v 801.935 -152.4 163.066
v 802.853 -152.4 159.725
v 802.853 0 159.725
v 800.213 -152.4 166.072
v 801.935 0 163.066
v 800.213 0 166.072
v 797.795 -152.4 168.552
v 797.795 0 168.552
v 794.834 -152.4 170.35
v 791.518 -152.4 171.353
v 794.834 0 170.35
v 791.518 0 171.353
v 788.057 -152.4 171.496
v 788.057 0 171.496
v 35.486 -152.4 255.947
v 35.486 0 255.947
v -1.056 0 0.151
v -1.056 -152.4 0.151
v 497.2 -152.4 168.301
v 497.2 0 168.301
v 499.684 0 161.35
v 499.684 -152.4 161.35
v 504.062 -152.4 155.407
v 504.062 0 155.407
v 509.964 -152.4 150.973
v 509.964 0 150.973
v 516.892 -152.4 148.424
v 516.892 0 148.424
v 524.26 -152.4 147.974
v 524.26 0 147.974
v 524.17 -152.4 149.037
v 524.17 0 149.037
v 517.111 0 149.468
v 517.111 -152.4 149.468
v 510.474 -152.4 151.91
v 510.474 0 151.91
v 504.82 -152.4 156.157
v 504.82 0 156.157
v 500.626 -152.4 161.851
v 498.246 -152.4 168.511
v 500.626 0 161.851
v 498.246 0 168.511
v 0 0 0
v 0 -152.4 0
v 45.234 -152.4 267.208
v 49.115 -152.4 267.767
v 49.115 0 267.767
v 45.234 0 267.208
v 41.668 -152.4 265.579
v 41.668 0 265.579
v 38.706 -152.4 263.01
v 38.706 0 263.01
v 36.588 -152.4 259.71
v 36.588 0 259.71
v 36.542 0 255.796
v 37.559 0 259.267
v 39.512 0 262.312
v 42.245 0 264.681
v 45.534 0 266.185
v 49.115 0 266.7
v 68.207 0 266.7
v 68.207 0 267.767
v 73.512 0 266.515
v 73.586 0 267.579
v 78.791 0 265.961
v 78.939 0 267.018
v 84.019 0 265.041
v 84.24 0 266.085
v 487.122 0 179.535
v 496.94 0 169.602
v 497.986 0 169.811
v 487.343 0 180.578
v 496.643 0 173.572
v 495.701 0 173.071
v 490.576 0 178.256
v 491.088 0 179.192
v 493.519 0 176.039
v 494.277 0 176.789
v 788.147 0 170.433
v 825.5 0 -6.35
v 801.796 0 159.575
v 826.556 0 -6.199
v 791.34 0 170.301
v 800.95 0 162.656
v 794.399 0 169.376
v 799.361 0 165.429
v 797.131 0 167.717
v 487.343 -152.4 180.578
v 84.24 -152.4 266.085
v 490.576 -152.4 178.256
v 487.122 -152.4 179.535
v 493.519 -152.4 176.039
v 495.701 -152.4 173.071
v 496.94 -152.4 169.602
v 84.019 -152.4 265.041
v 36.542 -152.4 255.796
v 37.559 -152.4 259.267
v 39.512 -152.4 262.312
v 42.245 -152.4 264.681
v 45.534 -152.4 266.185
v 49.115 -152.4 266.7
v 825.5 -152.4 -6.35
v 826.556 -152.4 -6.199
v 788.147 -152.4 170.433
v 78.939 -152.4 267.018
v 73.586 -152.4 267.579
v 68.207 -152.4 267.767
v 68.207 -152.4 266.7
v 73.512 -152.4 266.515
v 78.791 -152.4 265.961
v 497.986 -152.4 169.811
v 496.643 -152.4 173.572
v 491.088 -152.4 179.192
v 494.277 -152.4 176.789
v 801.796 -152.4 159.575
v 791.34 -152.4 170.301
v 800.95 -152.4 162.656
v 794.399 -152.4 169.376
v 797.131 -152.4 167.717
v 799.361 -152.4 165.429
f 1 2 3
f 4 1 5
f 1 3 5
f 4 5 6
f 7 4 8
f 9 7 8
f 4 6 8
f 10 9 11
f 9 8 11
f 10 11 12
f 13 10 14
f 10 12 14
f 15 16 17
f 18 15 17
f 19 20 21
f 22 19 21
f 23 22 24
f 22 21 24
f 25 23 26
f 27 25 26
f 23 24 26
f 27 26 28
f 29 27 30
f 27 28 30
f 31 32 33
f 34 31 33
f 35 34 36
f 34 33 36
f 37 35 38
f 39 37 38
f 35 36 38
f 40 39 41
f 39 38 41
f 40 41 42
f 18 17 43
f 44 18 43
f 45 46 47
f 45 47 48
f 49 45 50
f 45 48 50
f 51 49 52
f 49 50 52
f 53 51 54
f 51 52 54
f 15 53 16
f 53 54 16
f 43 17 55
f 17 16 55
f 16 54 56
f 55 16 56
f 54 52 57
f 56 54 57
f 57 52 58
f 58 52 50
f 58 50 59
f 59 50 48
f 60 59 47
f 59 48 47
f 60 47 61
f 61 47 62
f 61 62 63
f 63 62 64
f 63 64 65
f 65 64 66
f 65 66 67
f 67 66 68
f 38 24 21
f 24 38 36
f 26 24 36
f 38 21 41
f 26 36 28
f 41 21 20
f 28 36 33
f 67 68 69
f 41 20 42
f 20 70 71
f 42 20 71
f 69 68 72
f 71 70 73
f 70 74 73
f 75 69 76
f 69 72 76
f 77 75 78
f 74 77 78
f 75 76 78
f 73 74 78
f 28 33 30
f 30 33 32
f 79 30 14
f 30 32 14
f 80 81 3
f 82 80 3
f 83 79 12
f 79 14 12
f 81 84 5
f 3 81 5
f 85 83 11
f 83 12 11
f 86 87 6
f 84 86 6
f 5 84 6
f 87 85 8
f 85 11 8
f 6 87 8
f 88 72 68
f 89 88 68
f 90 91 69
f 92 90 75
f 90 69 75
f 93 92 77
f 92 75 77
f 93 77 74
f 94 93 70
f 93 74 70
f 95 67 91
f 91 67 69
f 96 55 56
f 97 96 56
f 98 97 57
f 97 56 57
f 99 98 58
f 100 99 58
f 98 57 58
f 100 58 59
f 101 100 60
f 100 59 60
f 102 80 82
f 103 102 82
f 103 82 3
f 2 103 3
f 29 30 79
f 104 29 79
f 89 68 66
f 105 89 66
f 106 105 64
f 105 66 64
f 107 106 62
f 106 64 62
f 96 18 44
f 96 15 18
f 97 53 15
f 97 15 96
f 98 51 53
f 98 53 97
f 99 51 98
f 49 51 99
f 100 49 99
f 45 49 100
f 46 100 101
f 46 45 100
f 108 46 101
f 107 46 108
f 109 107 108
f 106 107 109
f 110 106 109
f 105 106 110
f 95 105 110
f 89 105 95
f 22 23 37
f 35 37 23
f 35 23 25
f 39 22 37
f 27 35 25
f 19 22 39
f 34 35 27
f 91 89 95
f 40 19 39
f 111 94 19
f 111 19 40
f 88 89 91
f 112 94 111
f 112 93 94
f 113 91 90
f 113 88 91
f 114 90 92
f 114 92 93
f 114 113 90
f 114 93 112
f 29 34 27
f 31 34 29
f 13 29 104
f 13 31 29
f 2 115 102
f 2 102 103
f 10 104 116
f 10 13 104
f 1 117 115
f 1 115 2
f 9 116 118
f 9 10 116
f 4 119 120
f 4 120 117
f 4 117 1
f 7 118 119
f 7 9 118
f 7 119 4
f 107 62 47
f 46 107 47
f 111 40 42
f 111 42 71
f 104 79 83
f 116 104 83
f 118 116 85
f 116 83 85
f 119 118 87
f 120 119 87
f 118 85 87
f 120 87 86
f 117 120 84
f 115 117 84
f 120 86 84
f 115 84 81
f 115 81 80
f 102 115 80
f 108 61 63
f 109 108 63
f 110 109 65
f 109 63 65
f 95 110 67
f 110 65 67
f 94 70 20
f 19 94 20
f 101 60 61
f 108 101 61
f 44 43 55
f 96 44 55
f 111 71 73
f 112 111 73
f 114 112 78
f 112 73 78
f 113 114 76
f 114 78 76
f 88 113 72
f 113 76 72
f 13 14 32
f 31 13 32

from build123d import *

# Parameters (mm, degrees)
F1_DEPTH = 152.4


with BuildPart() as f1:
    # F0 (on Front) → F1 (new body)
    with BuildSketch(Plane.XZ):
        with BuildLine():
            Line((-1.056078, 0.150868), (0, 0))
            Line((0, 0), (36.542293, 255.796051))
            ThreePointArc((36.542293, 255.796051), (40.793589, 263.594265), (49.114652, 266.7))
            Line((49.114652, 266.7), (68.207103, 266.7))
            ThreePointArc((68.207103, 266.7), (76.156388, 266.284226), (84.018924, 265.04144))
            Line((84.018924, 265.04144), (487.121544, 179.534824))
            ThreePointArc((487.121544, 179.534824), (493.518553, 176.039147), (496.939615, 169.601926))
            Line((496.939615, 169.601926), (497.199711, 168.301447))
            ThreePointArc((497.199711, 168.301447), (506.851257, 152.974208), (524.260375, 147.974287))
            Line((524.260375, 147.974287), (788.147179, 170.432739))
            ThreePointArc((788.147179, 170.432739), (797.130539, 167.717236), (801.796495, 159.574535))
            Line((801.796495, 159.574535), (825.5, -6.35))
            Line((825.5, -6.35), (826.556078, -6.199132))
            Line((826.556078, -6.199132), (802.852573, 159.725403))
            ThreePointArc((802.852573, 159.725403), (797.794677, 168.552091), (788.056714, 171.495696))
            Line((788.056714, 171.495696), (524.169911, 149.037245))
            ThreePointArc((524.169911, 149.037245), (507.491976, 153.827168), (498.245794, 168.510664))
            Line((498.245794, 168.510664), (497.985698, 169.811142))
            ThreePointArc((497.985698, 169.811142), (494.277267, 176.78909), (487.342909, 180.578404))
            Line((487.342909, 180.578404), (84.24029, 266.08502))
            ThreePointArc((84.24029, 266.08502), (76.267678, 267.345205), (68.207103, 267.7668))
            Line((68.207103, 267.7668), (49.114652, 267.7668))
            ThreePointArc((49.114652, 267.7668), (40.09462, 264.400184), (35.486215, 255.94692))
            Line((35.486215, 255.94692), (-1.056078, 0.150868))
        make_face()
    extrude(amount=F1_DEPTH)


solid = f1.part
